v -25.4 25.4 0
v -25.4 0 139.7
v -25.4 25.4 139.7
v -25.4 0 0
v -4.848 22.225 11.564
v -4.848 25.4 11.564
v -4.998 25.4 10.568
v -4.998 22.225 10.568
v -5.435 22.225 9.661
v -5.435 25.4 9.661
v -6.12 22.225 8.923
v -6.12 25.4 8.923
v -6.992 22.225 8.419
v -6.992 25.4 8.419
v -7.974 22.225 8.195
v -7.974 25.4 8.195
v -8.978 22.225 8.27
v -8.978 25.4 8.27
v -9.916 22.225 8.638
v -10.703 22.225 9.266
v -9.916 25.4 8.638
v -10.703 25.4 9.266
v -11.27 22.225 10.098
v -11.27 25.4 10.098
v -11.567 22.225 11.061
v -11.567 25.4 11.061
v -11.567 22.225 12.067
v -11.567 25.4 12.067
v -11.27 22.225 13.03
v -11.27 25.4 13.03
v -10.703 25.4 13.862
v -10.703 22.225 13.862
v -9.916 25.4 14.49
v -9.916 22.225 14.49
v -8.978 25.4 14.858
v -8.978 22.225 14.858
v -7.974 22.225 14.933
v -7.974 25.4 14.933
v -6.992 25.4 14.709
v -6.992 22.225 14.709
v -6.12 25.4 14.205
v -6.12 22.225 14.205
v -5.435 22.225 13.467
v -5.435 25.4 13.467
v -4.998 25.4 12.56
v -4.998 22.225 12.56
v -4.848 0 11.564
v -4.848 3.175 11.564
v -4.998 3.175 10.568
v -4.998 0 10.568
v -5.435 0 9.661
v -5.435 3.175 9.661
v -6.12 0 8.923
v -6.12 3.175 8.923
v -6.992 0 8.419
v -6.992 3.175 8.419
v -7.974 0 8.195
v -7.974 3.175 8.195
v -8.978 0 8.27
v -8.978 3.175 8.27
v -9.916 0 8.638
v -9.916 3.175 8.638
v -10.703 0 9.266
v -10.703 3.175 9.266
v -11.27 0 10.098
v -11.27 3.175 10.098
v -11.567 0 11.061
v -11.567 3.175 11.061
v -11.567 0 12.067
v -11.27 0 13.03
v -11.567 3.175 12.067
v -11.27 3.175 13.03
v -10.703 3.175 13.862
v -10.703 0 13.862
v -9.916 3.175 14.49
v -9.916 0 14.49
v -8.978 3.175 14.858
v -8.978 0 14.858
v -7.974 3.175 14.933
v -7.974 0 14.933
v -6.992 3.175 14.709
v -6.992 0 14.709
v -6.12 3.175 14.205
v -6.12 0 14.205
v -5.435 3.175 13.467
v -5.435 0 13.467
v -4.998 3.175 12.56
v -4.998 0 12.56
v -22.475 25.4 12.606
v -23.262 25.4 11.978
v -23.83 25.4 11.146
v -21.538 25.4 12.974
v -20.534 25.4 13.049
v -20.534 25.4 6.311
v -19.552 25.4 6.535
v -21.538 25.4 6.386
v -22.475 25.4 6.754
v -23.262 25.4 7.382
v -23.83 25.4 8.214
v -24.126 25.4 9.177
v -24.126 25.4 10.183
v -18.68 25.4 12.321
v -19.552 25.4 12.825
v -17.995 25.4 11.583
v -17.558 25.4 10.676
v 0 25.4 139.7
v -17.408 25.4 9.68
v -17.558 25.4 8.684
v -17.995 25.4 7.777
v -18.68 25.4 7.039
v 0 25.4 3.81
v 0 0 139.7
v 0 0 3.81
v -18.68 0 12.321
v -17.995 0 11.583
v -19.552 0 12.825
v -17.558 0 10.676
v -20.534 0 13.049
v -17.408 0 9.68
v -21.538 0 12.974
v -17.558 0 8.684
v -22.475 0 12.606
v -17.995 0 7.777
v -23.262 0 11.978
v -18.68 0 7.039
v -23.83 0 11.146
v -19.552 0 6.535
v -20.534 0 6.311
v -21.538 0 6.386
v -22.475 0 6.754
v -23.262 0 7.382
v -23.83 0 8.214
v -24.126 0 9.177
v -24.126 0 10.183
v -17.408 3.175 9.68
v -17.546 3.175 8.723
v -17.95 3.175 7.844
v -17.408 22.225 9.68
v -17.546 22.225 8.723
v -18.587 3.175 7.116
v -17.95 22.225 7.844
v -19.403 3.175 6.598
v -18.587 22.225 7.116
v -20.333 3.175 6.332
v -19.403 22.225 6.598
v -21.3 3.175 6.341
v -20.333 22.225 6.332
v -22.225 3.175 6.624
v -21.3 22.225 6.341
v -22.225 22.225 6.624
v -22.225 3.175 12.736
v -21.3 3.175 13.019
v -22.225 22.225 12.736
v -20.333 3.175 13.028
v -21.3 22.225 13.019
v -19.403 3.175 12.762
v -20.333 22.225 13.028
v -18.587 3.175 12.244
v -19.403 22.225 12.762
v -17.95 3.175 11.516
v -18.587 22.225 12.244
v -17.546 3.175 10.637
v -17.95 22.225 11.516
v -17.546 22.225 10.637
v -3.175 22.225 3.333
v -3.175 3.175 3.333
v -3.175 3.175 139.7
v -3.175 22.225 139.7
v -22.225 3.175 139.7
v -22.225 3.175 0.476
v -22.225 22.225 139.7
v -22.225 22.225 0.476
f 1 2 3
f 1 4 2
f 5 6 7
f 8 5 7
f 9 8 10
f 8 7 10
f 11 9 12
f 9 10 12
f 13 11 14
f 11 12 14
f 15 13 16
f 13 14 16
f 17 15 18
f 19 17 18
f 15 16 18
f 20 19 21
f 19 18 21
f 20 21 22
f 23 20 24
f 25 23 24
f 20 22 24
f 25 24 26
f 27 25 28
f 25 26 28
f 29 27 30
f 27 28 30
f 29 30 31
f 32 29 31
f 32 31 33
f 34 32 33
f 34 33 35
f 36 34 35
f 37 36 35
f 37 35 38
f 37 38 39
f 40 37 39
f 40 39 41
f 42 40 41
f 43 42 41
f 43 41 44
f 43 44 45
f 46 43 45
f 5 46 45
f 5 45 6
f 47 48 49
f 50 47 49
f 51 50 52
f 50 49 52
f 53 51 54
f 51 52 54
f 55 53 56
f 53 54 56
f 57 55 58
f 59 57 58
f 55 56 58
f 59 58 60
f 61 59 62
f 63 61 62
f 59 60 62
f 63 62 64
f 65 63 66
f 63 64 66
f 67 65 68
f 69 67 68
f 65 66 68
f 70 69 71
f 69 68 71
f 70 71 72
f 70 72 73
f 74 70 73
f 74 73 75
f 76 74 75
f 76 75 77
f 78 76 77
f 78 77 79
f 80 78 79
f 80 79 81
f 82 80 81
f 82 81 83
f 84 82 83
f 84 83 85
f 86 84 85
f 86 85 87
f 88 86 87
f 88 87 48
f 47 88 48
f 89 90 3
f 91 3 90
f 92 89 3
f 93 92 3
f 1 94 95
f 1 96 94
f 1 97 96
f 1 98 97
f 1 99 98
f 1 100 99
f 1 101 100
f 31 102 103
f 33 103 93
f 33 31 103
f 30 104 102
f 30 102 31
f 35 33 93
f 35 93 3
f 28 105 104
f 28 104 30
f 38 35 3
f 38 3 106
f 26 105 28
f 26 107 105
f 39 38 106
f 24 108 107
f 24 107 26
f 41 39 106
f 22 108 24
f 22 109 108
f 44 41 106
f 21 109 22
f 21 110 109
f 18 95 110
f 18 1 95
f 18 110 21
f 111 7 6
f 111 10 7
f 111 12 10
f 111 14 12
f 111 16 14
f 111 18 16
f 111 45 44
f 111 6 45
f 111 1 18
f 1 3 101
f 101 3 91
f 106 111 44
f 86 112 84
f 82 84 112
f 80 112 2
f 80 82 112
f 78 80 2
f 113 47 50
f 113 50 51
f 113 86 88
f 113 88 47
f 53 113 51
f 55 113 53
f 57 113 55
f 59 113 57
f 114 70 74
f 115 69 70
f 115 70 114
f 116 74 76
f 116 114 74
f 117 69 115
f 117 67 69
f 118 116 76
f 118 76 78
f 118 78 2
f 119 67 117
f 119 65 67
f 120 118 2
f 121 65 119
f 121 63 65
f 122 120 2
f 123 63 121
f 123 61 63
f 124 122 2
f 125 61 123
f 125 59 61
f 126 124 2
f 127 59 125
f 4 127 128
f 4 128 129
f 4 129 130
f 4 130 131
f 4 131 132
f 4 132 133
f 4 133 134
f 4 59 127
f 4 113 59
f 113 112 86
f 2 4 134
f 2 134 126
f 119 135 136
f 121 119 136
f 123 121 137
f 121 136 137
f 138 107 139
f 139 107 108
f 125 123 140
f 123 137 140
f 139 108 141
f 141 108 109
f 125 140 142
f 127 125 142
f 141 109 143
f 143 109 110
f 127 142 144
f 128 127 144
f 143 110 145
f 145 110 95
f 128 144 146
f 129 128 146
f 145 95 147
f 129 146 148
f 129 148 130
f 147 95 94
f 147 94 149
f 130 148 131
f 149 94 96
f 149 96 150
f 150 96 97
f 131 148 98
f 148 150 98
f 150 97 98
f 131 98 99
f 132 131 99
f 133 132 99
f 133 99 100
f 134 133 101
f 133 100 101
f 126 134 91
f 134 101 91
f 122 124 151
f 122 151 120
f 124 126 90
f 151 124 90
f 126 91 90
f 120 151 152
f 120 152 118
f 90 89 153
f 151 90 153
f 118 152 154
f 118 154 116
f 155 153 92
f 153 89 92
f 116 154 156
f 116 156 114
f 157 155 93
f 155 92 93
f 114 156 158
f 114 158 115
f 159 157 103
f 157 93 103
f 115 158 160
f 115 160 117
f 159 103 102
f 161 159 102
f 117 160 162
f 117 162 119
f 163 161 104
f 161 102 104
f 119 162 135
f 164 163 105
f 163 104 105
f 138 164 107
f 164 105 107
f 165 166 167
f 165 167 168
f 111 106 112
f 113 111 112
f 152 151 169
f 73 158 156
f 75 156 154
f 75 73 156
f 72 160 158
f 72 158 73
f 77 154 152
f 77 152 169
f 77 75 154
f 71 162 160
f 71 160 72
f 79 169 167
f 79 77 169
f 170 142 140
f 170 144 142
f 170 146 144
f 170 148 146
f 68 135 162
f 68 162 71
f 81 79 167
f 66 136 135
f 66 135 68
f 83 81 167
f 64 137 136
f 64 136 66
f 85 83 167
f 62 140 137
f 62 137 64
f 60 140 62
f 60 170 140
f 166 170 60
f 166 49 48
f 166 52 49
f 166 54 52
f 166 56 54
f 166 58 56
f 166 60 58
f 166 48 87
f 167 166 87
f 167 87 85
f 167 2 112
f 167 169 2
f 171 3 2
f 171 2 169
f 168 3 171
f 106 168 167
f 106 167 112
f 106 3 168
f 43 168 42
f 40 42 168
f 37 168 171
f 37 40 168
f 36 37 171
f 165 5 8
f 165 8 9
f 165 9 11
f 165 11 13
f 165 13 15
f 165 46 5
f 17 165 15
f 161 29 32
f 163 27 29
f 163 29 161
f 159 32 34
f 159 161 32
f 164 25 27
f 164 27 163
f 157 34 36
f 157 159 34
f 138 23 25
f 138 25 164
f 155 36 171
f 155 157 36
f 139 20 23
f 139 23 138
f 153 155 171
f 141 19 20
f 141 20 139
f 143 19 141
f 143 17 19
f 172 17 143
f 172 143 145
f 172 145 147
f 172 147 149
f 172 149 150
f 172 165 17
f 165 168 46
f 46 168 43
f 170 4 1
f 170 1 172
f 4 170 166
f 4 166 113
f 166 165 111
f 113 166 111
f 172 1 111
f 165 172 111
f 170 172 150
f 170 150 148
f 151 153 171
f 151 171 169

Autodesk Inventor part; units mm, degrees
ref_plane "YZ Plane" through (0, 0, 0) normal (1, 0, 0) x (0, 1, 0)
ref_plane "XZ Plane" through (0, 0, 0) normal (0, 1, 0) x (-1, 0, 0)
ref_plane "XY Plane" through (0, 0, 0) normal (0, 0, 1) x (1, 0, 0)
sketch "Sketch1" plane through (0, 0, 0) normal (0, 0, 1) x (1, 0, 0)
  line L0 (0, 0) -> (-25.4, 0)
  line L1 (-25.4, 0) -> (-25.4, 25.4)
  line L2 (-25.4, 25.4) -> (0, 25.4)
  line L3 (0, 25.4) -> (0, 0)
  line L4 (-3.175, 22.225) -> (-22.225, 22.225)
  line L5 (-22.225, 22.225) -> (-22.225, 3.175)
  line L6 (-22.225, 3.175) -> (-3.175, 3.175)
  line L7 (-3.175, 3.175) -> (-3.175, 22.225)
  dimension "d0" = 25.4
  dimension "d1" = 25.4
  dimension "d2" = 3.175
extrude "Extrusion1" add sketch "Sketch1" along normal blind 139.7
sketch "Sketch2" plane through (-25.4, 25.4, 0) normal (0, 1, 0) x (1, 0, 0)
  line L0 (0, 0) -> (25.4, 0) projected
  line L1 (25.4, 0) -> (25.4, -139.7) projected
  line L2 (0, 0) -> (25.4, -3.8097)
  dimension "d5" = 8.53
extrude "Extrusion2" cut sketch "Sketch2" against normal blind 127
sketch "Sketch3" plane through (-25.4, 25.4, 139.7) normal (0, 1, 0) x (1, 0, 0)
  circle A0 centre (4.614, 130.02) radius 3.3782 projected
  circle A1 centre (17.1735, 128.136) radius 3.3782 projected
  point P0 (25.4, 139.7)
extrude "Extrusion3" cut sketch "Sketch3" against normal blind 63.5
properties part number "V tube" material "Aluminum 6061"
